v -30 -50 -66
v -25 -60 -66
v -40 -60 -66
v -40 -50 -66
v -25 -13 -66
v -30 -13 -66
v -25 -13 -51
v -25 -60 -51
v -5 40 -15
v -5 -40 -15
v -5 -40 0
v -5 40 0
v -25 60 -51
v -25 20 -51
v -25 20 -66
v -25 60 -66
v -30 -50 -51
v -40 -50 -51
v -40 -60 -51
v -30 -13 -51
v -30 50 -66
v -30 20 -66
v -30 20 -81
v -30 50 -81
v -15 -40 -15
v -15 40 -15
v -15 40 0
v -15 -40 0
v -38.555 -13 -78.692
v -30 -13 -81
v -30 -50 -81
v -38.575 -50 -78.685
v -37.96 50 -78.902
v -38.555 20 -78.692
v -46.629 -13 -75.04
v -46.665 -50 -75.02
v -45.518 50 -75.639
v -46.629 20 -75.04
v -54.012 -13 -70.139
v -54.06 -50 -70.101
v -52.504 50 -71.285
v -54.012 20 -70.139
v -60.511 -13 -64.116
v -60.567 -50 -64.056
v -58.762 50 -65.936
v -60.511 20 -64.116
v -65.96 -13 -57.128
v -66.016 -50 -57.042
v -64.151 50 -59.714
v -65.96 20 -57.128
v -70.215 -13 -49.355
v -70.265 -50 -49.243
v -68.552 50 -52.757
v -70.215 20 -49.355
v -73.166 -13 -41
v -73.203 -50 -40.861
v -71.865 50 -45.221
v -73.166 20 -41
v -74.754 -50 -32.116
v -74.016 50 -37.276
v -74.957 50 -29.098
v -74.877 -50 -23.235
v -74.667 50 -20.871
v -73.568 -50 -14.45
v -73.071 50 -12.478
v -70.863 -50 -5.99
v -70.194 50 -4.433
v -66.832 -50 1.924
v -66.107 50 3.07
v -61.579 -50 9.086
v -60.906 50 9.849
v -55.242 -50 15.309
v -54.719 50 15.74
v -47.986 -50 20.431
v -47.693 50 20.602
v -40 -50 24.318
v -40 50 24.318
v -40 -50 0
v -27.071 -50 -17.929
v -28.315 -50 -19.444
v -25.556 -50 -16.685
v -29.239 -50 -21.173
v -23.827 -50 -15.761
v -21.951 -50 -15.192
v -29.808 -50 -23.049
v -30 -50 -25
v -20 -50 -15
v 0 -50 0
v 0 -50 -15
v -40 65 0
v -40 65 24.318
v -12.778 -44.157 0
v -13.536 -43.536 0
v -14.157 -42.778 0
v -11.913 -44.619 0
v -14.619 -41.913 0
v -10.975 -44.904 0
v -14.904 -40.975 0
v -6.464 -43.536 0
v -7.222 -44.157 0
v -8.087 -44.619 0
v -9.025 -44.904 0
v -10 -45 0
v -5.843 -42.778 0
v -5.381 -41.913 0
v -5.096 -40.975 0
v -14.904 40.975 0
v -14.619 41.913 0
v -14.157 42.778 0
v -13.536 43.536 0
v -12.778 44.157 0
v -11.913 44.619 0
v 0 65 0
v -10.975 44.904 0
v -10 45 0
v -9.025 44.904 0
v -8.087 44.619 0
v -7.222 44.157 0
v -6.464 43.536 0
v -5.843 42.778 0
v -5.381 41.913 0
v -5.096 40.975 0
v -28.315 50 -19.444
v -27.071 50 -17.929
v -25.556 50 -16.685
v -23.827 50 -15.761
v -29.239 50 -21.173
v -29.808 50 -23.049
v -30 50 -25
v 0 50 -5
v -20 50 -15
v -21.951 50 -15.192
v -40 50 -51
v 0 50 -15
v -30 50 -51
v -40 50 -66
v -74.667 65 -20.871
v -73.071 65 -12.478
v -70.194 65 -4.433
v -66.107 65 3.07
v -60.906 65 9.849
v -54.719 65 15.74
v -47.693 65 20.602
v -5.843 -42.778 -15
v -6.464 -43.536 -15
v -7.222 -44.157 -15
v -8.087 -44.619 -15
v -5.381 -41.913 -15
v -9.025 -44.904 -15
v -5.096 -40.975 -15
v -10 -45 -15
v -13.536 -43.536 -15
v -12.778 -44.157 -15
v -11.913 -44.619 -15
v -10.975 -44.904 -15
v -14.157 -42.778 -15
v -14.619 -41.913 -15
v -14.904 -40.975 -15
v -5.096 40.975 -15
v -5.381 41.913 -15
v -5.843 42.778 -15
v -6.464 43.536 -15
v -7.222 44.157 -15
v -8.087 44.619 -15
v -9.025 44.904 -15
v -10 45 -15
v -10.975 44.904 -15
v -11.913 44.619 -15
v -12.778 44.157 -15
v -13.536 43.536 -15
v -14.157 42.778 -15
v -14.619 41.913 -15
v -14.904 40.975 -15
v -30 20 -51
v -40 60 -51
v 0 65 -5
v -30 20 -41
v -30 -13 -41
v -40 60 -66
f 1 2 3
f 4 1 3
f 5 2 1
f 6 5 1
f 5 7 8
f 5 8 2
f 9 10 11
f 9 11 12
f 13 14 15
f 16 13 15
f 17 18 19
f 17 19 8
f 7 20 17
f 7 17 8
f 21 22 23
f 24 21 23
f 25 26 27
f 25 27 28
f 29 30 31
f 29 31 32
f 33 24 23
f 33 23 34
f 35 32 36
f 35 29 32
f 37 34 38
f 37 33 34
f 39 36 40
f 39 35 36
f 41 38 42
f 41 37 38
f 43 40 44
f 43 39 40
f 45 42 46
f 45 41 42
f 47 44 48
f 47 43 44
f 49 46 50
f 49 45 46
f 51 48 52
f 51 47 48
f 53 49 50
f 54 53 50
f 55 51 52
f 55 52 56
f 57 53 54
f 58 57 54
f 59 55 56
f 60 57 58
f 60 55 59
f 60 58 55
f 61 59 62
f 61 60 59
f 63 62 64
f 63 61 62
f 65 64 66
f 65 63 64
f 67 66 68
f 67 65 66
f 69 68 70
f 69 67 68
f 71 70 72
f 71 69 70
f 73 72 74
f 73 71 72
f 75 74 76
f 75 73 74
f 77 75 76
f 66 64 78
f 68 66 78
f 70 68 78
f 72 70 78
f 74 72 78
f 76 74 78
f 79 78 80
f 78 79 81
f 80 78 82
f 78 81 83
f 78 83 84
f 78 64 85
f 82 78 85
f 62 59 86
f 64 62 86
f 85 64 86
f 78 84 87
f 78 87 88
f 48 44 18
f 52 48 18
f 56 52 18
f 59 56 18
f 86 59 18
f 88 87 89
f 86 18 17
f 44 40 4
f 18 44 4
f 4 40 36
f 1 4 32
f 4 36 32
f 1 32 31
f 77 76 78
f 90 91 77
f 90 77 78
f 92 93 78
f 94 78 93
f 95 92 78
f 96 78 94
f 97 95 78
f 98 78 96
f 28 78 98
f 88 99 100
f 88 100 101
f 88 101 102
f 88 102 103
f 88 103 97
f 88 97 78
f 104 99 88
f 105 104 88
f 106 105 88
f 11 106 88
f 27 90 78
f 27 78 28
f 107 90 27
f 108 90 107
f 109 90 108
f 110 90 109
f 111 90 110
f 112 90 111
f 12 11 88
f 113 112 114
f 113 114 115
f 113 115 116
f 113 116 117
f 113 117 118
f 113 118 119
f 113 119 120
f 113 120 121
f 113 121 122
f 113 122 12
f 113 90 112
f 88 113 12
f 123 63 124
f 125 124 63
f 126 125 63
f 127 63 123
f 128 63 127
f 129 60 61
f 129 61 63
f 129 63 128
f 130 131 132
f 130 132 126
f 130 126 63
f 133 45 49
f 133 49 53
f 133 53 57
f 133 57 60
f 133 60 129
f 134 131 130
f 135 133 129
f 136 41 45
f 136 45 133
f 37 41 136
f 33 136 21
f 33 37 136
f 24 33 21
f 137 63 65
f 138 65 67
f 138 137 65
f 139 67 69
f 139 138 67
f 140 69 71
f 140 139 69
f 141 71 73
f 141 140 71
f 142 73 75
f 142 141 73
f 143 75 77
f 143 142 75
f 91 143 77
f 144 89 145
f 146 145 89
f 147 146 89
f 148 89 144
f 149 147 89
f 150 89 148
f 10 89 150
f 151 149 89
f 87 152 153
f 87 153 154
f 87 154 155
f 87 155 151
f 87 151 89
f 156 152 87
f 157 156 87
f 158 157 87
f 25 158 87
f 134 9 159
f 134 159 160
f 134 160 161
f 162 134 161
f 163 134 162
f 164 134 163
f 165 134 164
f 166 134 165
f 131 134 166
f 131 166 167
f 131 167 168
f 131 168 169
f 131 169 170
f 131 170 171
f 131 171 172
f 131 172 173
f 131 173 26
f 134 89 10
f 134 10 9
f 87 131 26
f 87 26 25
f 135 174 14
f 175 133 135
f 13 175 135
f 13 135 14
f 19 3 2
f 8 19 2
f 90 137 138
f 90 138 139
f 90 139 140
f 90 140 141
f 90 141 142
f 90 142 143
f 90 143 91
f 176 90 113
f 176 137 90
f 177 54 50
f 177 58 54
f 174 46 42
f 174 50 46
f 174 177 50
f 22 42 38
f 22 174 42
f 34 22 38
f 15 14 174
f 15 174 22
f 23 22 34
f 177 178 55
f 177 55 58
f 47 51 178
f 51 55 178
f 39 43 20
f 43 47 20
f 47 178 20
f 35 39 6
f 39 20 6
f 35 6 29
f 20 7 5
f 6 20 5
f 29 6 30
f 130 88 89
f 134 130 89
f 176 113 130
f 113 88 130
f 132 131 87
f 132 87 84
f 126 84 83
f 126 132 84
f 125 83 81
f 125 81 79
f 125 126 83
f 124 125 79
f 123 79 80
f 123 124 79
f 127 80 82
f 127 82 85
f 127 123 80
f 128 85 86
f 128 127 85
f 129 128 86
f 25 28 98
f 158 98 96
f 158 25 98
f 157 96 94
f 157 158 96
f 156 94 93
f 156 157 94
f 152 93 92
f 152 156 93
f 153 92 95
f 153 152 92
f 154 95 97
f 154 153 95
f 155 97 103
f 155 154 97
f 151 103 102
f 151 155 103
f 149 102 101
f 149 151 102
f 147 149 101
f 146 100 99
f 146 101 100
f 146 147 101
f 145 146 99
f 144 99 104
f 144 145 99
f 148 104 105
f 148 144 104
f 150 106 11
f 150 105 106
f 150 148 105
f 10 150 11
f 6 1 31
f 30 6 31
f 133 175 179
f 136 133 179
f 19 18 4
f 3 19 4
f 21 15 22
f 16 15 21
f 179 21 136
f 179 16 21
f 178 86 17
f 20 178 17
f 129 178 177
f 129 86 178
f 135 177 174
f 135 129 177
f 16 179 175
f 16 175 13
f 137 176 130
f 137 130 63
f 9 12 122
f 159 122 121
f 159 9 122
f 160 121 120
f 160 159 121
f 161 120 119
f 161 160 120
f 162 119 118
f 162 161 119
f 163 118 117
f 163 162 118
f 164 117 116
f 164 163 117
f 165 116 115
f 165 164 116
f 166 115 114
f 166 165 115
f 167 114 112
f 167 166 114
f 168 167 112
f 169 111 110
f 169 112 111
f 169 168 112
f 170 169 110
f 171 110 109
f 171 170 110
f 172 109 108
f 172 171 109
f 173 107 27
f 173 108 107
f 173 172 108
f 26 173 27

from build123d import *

# Parameters (mm, degrees)
BOSS_EXTRUDE4_DEPTH = 50
SKETCH1_7_W         = 15
SKETCH1_7_H         = 15
BOSS_EXTRUDE5_DEPTH = 60
SKETCH5_W           = 40
SKETCH5_H           = 33
CUT_EXTRUDE1_DEPTH  = 120
BOSS_EXTRUDE6_START = 15
BOSS_EXTRUDE6_DEPTH = 15
CUT_EXTRUDE3_DEPTH  = 67


with BuildPart() as part:
    # Sketch1 → Boss-Extrude4 (new, symmetric)
    with BuildSketch(Plane(origin=(0, 0, 0), x_dir=(1, 0, 0), z_dir=(0, 1, 0))):
        with BuildLine():
            Line((0, 0), (0, 15))
            Line((0, 15), (-20, 15))
            ThreePointArc((-20, 15), (-27.071067812, 17.928932188), (-30, 25))
            Line((-30, 25), (-30, 51))
            Line((-30, 51), (-40, 51))
            Line((-40, 51), (-40, 66))
            Line((-40, 66), (-30, 66))
            Line((-30, 66), (-30, 81))
            ThreePointArc((-30, 81), (-74.753734942, 32.115625929), (-40, -24.318022962))
            Line((-40, -24.318022962), (-40, 0))
            Line((-40, 0), (0, 0))
        make_face()
    extrude(amount=BOSS_EXTRUDE4_DEPTH, both=True)

    # Sketch1<7> → Boss-Extrude5 (add, symmetric)
    with BuildSketch(Plane(origin=(0, 0, 0), x_dir=(1, 0, 0), z_dir=(0, 1, 0))):
        with Locations((-32.5, 58.5)):
            Rectangle(SKETCH1_7_W, SKETCH1_7_H)
    extrude(amount=BOSS_EXTRUDE5_DEPTH, both=True)

    # Sketch5 → Cut-Extrude1 (cut)
    with BuildSketch(Plane(origin=(0, 0, 0), x_dir=(0, 0, -1), z_dir=(1, 0, 0))):
        with Locations((61, 3.5)):
            Rectangle(SKETCH5_W, SKETCH5_H)
    extrude(amount=-CUT_EXTRUDE1_DEPTH, mode=Mode.SUBTRACT)

    # Sketch6 → Boss-Extrude6 (add)
    with BuildSketch(Plane(origin=(0, 50, 0), x_dir=(1, 0, 0), z_dir=(0, 1, 0)).offset(BOSS_EXTRUDE6_START)):
        with BuildLine():
            Line((0, 5), (-74.666698166, 20.870896633))
            ThreePointArc((-74.666698166, 20.870896633), (-63.638154949, -6.560297565), (-40, -24.318022962))
            Line((-40, -24.318022962), (-40, 0))
            Line((-40, 0), (0, 0))
            Line((0, 0), (0, 5))
        make_face()
    extrude(amount=-BOSS_EXTRUDE6_DEPTH)

    # Sketch8 → Cut-Extrude3 (cut)
    with BuildSketch(Plane(origin=(0, 0, -15), x_dir=(-1, 0, 0), z_dir=(0, 0, -1))):
        with BuildLine():
            Line((15, 40), (15, -40))
            ThreePointArc((15, -40), (10, -45), (5, -40))
            Line((5, -40), (5, 40))
            ThreePointArc((5, 40), (10, 45), (15, 40))
        make_face()
    extrude(amount=-CUT_EXTRUDE3_DEPTH, mode=Mode.SUBTRACT)


solid = part.part
